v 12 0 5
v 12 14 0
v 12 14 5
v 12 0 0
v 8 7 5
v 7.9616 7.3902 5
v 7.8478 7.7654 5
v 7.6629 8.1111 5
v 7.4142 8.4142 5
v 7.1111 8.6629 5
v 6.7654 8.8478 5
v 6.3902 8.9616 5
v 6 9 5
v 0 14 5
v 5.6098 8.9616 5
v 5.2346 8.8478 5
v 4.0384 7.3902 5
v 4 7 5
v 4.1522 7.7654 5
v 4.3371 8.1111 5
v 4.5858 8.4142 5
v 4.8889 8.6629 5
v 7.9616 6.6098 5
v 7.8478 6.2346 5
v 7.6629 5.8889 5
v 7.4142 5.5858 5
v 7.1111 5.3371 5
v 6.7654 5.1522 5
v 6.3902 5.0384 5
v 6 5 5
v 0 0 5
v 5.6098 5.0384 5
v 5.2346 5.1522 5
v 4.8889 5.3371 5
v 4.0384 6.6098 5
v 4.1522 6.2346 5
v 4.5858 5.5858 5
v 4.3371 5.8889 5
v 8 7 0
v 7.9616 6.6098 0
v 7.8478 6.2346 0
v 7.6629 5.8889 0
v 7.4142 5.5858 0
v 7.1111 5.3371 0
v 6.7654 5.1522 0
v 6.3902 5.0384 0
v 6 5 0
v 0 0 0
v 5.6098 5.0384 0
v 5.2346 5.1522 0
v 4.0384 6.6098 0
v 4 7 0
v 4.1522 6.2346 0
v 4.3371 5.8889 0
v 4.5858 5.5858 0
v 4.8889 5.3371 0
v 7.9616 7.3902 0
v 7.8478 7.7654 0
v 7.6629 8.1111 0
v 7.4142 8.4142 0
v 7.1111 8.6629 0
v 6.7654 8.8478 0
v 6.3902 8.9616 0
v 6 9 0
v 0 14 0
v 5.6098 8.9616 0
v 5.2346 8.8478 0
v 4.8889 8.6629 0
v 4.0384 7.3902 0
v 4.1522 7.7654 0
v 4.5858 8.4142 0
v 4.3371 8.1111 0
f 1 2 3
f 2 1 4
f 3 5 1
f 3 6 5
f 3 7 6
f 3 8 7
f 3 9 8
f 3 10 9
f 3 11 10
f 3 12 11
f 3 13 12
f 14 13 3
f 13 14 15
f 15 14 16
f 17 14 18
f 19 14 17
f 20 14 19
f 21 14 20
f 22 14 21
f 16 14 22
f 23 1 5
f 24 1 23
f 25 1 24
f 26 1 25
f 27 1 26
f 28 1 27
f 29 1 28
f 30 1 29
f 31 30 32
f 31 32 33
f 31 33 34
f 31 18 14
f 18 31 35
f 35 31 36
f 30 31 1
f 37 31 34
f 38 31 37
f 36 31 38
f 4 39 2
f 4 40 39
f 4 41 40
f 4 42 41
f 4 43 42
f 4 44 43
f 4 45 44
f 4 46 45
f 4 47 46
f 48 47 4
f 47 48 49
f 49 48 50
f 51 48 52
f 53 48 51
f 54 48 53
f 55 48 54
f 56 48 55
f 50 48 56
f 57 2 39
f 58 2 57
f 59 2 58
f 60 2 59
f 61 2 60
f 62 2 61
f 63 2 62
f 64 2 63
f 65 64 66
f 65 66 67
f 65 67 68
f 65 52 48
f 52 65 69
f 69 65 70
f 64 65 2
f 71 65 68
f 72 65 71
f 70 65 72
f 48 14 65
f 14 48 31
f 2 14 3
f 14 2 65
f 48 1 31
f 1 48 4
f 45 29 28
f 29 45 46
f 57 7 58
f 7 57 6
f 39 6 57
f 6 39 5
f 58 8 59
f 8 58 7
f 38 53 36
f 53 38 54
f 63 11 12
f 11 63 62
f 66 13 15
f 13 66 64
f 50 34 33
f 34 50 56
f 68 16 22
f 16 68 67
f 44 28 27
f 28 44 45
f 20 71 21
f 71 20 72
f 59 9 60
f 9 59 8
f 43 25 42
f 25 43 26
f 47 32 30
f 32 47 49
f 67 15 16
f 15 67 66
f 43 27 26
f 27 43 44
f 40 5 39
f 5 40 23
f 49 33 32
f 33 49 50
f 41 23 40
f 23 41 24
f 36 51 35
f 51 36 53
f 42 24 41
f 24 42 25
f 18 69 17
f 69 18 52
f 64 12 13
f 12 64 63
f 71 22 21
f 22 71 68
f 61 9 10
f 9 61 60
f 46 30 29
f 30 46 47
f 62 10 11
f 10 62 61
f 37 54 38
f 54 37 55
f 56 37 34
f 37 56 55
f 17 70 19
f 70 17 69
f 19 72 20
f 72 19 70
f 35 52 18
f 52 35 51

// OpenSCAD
$fn = 32;

// ----------------------------------------------------------------------
// Micro pad: drilled pad, 5-20 mm class
// ----------------------------------------------------------------------

// --- parameters (mm) ---
pad_l = 12;               // pad length, X
pad_w = 14;               // pad width, Y
pad_t = 5;                // pad thickness, Z
hole_d = 4;               // through hole diameter

difference() {
  cube([pad_l, pad_w, pad_t]);
  translate([pad_l / 2, pad_w / 2, -1])
    cylinder(h = pad_t + 2, d = hole_d);
}
